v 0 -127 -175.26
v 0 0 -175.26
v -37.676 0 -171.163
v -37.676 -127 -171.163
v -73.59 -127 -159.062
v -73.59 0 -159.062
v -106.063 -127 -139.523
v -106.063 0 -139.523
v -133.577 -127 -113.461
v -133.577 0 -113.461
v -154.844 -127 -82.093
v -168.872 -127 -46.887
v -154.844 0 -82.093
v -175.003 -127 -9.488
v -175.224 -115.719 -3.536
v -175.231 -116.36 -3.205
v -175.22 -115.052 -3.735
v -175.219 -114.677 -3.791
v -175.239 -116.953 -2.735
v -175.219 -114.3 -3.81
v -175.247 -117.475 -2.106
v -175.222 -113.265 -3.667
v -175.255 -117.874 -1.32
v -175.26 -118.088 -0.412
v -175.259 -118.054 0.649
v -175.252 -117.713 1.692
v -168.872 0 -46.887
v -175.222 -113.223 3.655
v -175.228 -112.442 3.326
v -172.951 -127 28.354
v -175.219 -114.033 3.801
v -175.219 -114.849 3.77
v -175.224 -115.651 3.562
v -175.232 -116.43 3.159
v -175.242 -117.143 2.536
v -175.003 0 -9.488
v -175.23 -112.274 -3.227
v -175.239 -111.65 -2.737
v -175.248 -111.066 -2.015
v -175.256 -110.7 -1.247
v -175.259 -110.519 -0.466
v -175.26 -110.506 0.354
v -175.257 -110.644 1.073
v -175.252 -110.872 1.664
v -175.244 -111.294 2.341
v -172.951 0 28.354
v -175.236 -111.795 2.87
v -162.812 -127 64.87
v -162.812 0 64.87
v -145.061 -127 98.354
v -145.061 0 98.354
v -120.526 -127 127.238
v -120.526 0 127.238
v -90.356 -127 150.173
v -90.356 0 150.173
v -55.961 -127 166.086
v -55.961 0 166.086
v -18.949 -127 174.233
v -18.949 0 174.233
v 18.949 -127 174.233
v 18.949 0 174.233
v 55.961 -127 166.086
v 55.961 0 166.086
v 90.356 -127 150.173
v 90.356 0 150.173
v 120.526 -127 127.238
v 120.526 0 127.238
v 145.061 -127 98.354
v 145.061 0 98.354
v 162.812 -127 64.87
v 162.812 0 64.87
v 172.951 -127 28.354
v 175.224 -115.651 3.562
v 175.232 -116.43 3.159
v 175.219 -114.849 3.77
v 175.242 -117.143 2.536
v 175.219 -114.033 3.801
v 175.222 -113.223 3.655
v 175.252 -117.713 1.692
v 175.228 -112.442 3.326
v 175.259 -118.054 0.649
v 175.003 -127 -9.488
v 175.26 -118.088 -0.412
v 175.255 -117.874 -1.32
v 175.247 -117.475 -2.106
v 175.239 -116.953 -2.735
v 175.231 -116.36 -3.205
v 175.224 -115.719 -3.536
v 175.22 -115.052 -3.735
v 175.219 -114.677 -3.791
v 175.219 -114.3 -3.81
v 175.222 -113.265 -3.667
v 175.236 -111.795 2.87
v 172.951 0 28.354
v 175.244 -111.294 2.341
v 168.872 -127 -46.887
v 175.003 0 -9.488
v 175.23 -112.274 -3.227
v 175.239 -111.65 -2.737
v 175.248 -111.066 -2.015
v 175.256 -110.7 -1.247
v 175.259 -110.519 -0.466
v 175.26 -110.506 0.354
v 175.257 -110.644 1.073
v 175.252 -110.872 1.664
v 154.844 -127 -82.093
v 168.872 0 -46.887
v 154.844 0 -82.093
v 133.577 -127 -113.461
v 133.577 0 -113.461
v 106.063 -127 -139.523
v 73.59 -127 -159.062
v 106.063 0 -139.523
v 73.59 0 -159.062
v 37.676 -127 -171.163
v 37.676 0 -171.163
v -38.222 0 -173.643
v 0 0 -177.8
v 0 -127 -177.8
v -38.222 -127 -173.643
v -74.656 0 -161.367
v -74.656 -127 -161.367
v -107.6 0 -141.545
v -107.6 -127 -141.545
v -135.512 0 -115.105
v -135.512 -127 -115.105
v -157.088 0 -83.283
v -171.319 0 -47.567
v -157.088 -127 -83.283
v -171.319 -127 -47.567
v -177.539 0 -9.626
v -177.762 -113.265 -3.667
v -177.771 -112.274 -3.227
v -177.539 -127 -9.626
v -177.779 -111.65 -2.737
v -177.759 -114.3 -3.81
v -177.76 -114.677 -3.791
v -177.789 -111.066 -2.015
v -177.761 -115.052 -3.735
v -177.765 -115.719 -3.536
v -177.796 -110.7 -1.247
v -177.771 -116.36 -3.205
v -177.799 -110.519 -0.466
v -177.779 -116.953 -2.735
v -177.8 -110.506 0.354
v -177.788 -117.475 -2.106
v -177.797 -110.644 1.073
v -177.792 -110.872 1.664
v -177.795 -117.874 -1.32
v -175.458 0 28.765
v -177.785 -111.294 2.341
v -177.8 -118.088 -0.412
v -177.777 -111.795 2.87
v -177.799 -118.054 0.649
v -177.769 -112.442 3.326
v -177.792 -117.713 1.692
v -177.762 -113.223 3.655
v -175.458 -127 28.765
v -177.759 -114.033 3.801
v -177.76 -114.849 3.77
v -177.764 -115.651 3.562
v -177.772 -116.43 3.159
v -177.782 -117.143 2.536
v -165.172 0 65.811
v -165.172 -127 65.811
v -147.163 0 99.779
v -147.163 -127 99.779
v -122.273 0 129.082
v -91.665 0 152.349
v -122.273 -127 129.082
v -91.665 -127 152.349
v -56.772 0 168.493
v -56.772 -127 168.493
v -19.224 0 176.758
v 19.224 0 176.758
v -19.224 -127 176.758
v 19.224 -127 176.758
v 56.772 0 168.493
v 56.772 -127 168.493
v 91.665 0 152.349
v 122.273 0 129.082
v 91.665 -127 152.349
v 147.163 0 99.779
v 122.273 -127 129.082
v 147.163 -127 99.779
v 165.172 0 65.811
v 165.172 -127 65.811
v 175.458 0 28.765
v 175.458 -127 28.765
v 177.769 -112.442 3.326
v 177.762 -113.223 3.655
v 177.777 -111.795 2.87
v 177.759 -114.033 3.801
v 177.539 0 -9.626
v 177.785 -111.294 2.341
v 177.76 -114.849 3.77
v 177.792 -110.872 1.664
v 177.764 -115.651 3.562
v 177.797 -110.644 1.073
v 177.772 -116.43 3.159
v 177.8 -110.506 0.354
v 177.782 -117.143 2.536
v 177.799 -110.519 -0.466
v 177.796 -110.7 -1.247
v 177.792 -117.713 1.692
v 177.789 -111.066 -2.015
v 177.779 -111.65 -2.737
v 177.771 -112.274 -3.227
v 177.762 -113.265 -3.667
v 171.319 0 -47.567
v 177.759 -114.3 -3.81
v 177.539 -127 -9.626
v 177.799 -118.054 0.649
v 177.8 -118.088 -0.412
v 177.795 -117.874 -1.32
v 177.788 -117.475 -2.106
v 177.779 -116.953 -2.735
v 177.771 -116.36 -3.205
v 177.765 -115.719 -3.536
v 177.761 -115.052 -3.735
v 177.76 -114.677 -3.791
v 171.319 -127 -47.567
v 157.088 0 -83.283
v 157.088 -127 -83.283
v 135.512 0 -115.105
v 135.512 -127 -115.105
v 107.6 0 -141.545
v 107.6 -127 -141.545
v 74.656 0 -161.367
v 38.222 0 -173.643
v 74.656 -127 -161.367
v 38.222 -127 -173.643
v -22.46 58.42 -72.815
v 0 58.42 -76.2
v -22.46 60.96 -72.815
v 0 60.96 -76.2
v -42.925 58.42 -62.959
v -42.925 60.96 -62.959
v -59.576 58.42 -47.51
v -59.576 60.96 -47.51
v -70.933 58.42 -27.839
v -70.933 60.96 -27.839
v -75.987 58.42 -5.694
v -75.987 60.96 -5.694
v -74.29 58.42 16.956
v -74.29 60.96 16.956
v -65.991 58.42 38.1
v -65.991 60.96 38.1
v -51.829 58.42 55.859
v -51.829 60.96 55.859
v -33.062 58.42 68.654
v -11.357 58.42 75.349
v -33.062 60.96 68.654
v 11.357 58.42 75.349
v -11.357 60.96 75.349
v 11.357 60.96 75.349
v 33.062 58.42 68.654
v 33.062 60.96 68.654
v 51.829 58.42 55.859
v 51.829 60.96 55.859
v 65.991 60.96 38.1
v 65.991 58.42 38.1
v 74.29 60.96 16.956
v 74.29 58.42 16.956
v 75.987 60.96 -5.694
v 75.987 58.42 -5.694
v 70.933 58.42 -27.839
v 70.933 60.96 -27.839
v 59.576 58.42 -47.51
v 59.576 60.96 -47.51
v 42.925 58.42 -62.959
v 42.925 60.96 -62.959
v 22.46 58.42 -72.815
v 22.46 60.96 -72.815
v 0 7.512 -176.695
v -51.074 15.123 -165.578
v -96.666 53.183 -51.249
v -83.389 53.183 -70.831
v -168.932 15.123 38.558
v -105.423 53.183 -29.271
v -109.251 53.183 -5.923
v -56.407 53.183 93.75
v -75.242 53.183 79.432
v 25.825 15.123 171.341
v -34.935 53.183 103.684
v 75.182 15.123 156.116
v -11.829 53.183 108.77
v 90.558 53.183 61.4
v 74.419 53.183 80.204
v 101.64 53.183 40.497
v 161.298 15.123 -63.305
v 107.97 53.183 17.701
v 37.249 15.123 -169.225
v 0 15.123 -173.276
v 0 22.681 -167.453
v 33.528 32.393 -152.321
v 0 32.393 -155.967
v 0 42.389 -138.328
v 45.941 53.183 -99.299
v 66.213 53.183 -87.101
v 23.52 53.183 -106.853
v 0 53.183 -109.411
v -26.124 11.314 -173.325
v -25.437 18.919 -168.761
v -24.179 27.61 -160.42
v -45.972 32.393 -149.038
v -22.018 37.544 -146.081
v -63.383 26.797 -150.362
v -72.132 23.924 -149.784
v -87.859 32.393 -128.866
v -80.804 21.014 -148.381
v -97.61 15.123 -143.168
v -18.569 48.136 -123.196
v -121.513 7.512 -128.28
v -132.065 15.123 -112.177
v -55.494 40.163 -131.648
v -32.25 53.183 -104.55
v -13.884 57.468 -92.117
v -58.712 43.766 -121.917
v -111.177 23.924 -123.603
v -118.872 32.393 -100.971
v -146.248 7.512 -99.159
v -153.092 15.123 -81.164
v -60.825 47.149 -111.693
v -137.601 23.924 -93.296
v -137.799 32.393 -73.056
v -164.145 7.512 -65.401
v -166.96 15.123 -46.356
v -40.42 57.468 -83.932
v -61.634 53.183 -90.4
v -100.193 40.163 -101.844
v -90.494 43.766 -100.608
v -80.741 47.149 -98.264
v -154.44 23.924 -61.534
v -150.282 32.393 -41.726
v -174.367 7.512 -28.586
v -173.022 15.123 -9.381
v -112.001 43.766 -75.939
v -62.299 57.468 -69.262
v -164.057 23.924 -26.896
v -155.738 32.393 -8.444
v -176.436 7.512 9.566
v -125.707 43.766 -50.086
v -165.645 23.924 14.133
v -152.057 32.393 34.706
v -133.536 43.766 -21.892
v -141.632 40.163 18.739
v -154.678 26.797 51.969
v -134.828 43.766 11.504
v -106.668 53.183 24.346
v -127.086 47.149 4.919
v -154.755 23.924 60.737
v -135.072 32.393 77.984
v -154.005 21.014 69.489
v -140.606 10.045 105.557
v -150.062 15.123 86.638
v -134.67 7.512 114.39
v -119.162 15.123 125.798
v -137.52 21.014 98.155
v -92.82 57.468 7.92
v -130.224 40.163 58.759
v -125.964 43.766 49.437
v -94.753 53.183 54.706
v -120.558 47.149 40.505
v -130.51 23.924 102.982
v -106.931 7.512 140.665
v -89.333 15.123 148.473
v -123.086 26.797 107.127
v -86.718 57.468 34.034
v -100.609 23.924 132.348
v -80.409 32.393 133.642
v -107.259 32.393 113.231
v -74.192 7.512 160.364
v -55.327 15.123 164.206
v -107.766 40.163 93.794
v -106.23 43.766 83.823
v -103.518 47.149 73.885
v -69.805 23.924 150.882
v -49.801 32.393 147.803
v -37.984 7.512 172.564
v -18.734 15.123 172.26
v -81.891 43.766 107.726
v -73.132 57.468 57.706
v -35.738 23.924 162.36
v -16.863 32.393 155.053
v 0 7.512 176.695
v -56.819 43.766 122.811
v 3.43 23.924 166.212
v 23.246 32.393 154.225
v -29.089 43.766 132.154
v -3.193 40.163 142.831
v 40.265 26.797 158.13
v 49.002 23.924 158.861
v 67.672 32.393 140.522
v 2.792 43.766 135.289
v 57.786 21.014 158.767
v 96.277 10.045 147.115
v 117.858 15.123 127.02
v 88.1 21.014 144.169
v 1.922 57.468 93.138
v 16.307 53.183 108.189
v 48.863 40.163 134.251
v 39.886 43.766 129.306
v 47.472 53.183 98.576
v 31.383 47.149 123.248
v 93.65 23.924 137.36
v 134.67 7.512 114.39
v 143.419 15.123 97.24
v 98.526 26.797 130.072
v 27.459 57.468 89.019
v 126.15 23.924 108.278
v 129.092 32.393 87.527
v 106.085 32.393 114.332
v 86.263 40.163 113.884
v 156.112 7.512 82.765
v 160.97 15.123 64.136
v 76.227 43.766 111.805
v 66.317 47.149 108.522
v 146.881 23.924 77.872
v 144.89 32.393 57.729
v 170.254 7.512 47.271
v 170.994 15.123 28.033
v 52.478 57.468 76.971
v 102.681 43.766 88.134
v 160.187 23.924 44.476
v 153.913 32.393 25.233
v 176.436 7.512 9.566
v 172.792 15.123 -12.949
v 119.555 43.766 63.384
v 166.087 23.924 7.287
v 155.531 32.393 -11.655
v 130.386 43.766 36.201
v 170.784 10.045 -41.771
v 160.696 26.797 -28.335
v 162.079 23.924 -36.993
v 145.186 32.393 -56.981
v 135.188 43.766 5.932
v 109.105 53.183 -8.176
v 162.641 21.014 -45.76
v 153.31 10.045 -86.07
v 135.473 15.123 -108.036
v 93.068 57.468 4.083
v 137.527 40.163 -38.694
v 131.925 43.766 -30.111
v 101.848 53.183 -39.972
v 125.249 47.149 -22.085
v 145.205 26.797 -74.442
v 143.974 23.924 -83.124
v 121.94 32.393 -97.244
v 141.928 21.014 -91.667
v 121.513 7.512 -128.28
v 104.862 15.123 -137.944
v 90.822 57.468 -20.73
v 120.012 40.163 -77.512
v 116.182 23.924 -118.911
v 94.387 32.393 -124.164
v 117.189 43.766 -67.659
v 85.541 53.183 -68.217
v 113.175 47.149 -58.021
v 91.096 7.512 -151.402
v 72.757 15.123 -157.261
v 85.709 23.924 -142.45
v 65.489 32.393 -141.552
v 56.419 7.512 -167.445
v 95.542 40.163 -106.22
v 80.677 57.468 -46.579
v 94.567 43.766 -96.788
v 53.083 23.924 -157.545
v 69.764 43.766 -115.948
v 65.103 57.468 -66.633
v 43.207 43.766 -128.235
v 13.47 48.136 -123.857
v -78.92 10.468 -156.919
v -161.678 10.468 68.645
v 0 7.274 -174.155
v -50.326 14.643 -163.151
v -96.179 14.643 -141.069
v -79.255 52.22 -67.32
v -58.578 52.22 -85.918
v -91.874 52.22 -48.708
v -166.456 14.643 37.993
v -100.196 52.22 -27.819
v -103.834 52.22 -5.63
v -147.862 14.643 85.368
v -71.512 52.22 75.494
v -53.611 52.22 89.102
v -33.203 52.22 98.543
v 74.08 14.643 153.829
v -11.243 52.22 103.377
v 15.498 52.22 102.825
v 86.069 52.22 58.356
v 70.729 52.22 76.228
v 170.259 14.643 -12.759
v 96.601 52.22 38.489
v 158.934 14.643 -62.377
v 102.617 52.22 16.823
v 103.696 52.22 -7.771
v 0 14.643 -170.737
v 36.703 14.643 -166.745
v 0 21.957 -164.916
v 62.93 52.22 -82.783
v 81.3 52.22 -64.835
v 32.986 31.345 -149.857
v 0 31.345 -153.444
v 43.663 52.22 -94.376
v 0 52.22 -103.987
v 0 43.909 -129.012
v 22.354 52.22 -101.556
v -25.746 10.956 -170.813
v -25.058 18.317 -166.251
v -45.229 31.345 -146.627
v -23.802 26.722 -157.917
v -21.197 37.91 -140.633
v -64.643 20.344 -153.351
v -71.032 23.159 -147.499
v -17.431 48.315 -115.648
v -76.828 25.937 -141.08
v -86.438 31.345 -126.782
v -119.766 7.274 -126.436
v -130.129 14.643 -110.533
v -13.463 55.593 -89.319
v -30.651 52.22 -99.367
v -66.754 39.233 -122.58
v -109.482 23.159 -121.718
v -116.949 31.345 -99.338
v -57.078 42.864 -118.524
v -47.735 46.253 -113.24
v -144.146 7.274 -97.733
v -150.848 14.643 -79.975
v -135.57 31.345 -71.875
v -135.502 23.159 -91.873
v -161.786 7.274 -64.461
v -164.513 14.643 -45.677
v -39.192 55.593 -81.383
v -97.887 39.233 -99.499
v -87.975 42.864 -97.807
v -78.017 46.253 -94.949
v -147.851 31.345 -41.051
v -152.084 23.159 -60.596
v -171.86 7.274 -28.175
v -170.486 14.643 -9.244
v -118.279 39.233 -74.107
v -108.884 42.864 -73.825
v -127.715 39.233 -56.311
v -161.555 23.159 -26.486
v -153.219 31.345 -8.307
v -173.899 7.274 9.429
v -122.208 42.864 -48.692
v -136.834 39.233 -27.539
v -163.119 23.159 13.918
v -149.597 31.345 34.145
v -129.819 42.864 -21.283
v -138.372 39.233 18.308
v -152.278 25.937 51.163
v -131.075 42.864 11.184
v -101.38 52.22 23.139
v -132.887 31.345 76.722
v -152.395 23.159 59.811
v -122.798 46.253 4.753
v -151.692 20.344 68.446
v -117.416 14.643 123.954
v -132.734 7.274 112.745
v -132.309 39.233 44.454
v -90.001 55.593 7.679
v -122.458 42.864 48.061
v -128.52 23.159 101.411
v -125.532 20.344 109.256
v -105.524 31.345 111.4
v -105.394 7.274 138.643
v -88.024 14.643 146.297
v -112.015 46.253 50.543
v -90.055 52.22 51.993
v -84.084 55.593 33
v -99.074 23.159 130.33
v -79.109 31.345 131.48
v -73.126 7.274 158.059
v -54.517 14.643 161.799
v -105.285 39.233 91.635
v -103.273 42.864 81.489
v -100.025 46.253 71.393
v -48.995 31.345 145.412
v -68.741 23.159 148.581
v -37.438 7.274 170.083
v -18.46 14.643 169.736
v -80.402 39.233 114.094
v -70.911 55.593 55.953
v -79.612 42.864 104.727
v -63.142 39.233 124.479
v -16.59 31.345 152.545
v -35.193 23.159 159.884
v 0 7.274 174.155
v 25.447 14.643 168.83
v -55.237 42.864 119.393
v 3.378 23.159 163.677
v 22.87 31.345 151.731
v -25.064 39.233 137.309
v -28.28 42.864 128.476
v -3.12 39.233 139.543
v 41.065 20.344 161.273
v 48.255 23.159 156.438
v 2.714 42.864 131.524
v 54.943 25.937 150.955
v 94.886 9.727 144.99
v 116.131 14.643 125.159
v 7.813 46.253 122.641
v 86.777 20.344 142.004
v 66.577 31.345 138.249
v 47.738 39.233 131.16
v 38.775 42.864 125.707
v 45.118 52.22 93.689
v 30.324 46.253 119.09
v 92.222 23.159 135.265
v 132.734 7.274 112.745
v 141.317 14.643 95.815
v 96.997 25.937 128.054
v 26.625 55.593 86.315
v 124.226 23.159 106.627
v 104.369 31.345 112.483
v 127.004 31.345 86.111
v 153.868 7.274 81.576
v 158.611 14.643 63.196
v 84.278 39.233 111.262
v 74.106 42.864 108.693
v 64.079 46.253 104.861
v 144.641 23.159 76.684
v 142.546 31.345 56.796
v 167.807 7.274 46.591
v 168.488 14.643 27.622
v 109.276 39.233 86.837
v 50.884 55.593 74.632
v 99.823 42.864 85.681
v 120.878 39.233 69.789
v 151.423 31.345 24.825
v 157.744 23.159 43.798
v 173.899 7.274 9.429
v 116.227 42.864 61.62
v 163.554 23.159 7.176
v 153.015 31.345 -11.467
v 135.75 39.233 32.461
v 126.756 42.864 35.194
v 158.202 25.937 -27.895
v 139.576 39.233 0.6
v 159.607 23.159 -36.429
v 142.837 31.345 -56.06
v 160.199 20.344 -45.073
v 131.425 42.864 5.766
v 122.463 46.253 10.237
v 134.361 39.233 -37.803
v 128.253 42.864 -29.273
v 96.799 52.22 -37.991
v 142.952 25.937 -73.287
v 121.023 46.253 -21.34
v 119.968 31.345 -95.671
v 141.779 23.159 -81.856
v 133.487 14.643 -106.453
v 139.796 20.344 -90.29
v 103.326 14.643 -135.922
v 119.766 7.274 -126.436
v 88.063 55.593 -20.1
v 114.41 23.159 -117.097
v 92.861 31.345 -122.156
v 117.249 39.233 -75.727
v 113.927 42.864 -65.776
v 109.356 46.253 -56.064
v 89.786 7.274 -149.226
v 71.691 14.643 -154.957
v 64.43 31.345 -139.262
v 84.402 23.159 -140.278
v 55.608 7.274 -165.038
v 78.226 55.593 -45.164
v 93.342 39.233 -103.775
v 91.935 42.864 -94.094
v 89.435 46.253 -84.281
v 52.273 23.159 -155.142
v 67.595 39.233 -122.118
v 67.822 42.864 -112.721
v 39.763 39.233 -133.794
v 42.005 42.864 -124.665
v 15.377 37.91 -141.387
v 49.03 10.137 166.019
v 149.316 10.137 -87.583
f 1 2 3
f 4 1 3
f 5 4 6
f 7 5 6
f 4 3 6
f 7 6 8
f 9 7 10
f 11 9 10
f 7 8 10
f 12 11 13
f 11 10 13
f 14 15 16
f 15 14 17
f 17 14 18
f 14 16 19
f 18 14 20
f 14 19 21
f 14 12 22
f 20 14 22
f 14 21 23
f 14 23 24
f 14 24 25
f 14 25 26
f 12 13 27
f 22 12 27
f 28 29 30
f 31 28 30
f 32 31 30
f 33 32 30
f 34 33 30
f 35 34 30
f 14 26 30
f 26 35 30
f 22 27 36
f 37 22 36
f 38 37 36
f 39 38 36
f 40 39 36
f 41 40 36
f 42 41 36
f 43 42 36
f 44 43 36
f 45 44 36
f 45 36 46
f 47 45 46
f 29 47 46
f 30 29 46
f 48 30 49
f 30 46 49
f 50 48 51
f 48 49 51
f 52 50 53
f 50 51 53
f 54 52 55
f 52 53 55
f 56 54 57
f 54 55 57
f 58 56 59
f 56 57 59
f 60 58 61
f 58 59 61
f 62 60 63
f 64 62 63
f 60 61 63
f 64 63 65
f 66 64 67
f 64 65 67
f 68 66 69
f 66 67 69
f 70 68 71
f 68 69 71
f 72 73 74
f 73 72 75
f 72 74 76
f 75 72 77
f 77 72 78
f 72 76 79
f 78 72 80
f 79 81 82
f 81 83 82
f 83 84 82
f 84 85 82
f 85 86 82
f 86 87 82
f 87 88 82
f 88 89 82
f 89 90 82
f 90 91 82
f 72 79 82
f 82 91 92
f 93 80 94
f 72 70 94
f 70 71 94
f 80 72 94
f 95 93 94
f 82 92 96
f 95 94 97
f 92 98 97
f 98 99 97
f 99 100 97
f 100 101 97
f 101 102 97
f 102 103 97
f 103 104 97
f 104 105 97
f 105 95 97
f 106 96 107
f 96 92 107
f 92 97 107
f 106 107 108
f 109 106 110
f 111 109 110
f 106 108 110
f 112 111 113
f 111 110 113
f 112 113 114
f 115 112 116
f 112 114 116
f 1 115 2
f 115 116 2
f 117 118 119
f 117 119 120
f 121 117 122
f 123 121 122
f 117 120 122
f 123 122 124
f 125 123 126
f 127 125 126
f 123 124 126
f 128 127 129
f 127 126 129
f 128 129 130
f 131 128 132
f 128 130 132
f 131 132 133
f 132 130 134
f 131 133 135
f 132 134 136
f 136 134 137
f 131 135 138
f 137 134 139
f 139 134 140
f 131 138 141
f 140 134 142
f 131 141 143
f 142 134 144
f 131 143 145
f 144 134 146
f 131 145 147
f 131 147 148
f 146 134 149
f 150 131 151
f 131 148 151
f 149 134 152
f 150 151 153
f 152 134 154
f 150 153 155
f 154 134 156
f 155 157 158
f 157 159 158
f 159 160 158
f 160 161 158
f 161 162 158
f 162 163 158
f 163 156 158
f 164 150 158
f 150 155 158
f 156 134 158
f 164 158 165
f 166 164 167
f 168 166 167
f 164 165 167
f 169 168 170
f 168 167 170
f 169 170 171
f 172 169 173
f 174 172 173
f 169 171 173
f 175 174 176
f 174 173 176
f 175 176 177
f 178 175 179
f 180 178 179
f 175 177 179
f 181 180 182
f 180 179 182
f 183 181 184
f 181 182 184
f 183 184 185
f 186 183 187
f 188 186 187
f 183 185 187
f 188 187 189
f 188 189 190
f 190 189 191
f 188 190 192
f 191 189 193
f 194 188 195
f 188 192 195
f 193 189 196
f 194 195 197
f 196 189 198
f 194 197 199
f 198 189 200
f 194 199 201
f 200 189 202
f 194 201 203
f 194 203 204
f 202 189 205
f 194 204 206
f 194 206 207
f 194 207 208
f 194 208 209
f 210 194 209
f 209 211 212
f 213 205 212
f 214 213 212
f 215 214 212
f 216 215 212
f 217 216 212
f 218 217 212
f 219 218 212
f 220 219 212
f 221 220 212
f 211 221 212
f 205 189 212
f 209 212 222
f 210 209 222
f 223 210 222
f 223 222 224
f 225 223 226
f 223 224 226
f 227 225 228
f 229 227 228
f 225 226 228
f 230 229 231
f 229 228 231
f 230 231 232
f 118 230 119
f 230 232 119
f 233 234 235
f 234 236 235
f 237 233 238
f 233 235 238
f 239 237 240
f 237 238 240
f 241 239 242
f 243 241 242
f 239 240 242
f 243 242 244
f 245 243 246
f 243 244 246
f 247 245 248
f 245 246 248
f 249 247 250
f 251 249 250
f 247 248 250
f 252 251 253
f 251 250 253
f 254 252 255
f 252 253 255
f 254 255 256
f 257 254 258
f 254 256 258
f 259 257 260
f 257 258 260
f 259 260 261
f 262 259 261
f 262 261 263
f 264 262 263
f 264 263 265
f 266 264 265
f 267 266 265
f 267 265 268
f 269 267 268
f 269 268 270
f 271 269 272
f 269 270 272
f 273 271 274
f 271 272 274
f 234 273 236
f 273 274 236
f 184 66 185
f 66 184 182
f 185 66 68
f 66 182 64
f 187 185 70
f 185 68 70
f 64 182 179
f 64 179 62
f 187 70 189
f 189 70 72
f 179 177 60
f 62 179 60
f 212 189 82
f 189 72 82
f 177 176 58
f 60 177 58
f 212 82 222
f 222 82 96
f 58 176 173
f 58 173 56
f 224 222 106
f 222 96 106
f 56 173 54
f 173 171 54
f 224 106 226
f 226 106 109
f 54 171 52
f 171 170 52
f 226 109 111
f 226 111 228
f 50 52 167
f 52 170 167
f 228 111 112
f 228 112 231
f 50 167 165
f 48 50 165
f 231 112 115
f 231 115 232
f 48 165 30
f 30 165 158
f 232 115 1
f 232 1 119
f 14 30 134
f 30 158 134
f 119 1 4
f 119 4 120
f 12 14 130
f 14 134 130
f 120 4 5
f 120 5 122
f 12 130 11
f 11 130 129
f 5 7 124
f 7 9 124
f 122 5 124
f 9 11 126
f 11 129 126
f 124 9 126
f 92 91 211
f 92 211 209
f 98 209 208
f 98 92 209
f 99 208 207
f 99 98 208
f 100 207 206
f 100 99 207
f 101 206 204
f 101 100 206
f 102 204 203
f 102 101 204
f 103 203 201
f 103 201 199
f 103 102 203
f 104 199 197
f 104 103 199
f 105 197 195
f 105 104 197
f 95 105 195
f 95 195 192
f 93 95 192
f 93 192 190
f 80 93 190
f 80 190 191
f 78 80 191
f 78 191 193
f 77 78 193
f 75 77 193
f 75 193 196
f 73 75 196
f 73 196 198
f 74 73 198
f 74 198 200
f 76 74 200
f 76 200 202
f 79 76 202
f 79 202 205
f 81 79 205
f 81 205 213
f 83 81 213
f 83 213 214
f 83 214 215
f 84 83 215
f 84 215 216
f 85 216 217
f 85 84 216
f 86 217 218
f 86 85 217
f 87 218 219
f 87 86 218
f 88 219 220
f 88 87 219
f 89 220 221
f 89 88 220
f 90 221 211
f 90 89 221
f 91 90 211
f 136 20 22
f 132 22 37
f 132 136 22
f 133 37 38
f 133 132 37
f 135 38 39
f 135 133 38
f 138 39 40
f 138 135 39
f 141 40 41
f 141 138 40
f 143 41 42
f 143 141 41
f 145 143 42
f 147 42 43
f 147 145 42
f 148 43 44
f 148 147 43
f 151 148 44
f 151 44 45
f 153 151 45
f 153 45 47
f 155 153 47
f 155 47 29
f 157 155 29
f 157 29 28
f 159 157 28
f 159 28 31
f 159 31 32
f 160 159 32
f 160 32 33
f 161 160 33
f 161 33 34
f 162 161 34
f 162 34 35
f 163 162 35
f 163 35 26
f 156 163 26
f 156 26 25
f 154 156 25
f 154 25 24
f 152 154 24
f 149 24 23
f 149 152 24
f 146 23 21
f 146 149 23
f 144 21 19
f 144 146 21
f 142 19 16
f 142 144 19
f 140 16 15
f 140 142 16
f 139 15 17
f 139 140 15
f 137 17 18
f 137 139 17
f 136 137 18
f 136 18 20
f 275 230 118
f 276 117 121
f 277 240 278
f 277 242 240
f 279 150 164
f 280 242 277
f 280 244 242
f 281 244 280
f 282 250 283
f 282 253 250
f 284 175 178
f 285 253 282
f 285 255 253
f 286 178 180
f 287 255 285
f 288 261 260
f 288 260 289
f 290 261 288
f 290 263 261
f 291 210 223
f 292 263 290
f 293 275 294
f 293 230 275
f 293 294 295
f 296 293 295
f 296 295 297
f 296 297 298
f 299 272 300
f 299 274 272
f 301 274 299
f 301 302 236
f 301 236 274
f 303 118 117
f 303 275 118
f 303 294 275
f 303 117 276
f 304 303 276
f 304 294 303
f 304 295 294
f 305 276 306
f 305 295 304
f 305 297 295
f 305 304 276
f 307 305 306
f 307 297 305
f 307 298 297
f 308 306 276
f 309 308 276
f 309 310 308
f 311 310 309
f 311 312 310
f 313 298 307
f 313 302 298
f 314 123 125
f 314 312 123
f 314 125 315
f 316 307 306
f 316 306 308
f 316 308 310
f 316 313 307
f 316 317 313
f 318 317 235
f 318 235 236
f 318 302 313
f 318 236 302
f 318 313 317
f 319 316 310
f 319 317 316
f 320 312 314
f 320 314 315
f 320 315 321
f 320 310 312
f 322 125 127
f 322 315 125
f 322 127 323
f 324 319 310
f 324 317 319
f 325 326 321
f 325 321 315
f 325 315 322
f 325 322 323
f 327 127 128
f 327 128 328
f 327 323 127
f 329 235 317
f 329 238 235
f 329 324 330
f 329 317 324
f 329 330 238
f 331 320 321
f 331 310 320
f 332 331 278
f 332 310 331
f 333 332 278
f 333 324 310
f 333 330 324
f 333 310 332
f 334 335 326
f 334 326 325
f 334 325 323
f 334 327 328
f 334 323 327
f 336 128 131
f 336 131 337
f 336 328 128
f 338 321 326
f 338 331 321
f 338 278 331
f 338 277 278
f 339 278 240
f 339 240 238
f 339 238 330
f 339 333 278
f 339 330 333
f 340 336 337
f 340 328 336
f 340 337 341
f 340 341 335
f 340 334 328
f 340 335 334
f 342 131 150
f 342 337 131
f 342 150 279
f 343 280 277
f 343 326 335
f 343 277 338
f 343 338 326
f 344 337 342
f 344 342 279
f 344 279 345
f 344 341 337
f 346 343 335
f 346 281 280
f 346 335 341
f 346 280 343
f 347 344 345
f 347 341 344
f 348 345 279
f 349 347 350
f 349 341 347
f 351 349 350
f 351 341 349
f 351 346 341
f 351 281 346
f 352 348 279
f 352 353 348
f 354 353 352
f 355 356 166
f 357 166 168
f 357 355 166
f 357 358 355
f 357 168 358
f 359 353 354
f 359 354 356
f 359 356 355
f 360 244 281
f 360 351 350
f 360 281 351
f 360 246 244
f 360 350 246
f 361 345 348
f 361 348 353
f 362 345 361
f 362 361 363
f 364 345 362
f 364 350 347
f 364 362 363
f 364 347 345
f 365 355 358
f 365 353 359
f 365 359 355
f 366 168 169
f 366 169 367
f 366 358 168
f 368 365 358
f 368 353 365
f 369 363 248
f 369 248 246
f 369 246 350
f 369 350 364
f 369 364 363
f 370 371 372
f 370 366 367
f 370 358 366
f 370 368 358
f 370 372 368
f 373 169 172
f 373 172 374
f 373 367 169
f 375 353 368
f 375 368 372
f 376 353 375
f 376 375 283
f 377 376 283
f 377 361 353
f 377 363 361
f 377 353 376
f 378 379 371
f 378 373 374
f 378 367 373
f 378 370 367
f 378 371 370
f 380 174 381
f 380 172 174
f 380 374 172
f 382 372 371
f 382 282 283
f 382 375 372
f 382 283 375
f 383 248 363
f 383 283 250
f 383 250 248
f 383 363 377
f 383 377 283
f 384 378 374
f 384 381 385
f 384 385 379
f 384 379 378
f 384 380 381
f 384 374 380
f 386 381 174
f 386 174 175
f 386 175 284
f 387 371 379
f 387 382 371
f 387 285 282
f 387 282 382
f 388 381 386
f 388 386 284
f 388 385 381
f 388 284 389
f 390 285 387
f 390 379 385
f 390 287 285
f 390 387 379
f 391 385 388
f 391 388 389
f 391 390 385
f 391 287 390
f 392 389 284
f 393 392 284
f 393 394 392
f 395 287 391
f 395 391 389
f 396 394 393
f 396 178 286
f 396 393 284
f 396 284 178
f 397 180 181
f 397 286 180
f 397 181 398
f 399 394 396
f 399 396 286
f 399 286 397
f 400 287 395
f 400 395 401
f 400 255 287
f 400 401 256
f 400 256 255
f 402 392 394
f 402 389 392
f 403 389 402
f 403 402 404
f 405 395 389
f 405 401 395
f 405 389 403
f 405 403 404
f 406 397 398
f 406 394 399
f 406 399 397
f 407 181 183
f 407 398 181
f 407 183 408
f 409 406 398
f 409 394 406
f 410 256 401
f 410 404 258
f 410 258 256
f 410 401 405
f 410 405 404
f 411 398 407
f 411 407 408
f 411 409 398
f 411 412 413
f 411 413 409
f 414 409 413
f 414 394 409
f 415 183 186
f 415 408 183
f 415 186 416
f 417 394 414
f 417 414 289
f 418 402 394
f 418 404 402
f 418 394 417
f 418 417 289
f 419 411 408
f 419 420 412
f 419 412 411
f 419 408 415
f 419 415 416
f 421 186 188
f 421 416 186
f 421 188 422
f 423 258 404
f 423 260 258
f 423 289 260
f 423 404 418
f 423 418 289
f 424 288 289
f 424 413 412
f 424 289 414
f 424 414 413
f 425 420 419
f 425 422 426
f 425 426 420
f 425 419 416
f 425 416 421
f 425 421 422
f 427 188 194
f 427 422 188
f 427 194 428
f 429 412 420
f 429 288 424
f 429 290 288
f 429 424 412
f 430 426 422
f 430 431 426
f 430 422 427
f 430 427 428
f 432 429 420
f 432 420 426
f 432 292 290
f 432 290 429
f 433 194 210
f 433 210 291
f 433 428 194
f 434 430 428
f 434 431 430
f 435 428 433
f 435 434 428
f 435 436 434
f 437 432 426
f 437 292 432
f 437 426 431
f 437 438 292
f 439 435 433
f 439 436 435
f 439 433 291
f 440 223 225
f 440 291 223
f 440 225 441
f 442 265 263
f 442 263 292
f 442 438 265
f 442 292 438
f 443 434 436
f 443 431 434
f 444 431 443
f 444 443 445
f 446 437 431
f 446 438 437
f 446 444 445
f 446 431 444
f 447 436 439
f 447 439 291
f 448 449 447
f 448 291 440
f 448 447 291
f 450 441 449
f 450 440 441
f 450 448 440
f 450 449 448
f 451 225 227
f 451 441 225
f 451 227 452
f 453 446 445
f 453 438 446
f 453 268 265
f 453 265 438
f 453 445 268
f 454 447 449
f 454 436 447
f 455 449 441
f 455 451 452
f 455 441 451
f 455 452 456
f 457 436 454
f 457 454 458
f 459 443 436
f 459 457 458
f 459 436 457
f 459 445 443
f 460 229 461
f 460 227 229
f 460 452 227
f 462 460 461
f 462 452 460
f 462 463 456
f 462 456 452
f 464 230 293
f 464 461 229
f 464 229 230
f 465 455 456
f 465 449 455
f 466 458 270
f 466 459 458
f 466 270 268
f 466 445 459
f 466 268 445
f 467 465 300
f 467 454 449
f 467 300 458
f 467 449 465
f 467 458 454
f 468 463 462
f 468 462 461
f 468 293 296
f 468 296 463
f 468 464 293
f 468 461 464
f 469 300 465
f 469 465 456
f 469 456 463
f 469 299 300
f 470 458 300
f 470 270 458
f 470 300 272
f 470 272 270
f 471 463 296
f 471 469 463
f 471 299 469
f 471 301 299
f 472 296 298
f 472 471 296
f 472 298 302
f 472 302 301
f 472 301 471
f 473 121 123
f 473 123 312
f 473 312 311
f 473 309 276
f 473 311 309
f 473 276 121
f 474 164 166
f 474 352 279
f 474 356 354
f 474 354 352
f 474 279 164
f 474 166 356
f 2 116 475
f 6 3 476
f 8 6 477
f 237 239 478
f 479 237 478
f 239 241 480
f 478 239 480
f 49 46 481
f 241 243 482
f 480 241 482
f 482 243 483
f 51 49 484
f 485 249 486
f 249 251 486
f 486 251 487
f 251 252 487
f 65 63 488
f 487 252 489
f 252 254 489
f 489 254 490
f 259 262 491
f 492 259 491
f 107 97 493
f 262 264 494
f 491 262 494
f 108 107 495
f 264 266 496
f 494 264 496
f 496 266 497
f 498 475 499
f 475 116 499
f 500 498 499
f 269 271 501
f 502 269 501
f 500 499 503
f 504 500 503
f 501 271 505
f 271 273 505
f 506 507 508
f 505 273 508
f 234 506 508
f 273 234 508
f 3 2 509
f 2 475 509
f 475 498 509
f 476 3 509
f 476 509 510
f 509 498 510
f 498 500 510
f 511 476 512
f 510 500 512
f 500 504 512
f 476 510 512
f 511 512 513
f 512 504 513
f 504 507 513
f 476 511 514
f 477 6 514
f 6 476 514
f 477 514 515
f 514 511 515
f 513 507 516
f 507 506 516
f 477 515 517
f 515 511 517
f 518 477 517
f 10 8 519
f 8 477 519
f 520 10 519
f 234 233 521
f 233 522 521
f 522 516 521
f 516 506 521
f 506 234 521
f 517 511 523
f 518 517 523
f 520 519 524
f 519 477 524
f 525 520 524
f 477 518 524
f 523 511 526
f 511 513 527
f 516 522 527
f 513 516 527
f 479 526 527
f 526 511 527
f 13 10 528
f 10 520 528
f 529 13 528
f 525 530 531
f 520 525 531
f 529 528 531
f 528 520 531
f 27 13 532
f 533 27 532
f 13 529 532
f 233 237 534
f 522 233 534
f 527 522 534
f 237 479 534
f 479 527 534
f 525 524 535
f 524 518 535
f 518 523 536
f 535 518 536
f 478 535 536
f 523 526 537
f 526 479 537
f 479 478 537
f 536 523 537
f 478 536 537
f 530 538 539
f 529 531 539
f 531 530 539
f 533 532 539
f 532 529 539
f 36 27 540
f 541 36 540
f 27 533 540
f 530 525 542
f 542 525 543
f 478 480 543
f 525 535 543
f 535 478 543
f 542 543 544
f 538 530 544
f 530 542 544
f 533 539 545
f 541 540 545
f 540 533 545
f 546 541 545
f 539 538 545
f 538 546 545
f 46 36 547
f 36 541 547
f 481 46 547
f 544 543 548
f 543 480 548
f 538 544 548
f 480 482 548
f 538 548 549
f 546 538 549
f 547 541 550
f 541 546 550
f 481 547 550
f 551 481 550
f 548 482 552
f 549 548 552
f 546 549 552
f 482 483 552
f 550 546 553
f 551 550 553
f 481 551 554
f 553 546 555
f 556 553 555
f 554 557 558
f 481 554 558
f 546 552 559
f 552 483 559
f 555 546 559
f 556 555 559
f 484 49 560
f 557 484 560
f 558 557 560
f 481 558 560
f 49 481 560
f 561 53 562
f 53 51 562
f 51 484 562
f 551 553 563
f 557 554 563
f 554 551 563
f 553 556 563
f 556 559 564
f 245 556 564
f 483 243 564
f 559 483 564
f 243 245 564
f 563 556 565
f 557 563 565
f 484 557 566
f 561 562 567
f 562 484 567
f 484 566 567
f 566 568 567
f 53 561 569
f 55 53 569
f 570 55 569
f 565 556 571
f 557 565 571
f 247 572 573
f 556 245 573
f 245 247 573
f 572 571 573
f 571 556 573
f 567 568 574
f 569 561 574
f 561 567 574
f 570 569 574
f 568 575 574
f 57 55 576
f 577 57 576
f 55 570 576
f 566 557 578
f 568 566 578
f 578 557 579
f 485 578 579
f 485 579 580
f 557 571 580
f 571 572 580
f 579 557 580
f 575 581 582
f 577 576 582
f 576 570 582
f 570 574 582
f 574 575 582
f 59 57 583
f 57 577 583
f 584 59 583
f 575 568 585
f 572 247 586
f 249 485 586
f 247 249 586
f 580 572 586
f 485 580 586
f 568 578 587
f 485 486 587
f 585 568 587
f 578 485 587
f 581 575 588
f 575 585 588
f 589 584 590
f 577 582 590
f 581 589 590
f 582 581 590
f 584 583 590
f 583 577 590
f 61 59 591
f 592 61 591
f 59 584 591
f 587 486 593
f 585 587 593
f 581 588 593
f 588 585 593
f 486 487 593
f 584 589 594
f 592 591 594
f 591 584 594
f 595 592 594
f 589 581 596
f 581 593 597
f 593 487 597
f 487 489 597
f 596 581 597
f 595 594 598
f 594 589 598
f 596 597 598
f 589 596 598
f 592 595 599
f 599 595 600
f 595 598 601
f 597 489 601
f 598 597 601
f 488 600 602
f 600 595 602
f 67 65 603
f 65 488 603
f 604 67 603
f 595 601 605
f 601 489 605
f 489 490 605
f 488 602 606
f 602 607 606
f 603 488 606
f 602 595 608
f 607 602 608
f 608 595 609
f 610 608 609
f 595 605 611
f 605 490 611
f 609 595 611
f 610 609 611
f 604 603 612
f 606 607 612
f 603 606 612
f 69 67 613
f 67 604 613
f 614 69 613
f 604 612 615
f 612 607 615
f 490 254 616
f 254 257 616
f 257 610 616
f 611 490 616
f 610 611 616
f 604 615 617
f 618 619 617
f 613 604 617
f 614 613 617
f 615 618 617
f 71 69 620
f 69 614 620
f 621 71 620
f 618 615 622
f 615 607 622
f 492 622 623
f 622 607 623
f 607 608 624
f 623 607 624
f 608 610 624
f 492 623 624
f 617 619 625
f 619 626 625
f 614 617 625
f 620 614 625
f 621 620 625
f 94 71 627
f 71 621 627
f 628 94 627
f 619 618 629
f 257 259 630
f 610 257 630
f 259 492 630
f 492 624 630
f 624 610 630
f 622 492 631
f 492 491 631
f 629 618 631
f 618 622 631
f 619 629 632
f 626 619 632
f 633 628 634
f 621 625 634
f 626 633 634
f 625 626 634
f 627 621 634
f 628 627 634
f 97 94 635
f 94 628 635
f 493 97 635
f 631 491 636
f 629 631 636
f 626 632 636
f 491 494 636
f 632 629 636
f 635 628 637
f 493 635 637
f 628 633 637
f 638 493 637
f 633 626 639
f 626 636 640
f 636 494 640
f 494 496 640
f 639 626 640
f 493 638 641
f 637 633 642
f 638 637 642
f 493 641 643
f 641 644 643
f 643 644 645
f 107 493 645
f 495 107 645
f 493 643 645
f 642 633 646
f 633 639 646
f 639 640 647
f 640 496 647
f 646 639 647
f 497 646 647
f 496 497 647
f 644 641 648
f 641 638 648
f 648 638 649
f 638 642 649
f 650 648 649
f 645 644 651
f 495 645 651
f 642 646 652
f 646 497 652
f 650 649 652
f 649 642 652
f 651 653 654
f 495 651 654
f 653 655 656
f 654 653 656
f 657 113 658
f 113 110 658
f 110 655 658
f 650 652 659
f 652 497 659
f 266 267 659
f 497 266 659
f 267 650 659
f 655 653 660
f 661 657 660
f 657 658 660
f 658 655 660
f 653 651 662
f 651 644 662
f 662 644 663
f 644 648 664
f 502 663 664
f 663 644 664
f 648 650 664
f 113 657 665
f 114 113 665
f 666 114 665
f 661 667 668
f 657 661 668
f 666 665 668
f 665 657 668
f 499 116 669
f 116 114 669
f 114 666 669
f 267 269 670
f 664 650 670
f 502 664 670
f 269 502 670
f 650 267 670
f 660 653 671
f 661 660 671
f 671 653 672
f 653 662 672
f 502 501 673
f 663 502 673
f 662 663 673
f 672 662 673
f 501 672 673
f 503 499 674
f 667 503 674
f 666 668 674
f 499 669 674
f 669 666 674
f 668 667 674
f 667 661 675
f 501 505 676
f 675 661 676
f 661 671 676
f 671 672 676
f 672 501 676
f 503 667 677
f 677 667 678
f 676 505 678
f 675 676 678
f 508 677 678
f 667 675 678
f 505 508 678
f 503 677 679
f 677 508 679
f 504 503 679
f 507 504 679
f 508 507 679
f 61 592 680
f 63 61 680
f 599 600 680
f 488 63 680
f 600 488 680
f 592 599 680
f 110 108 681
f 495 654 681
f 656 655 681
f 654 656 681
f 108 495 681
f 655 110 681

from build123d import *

# Parameters (mm, degrees)
CUT_EXTRUDE1_DEPTH      = 282.699627389
CUT_EXTRUDE1_DEPTH_BACK = 282.699627389
SKETCH2_R               = 3.81


with BuildPart() as part:
    # Sketch1 → Revolve1 (revolve)
    with BuildSketch(Plane.XY):
        with BuildLine():
            Line((175.26, -127), (175.26, 0))
            add(Edge.make_bspline(
                [(175.26, 0), (175.26, 40.716969697), (76.2, 58.42)],
                knots=[0, 0, 0, 1.120999466, 1.120999466, 1.120999466], degree=2, weights=[1, 0.846989554, 1]))
            Line((76.2, 58.42), (76.2, 60.96))
            add(Edge.make_bspline(
                [(177.8, 0), (177.8, 42.672), (76.2, 60.96)],
                knots=[0, 0, 0, 1.127885283, 1.127885283, 1.127885283], degree=2, weights=[1, 0.845154255, 1]))
            Line((177.8, 0), (177.8, -127))
            Line((177.8, -127), (175.26, -127))
        make_face()
    revolve(axis=Axis((0, -109.728, 0), (0, 1, 0)))

    # Sketch2 → Cut-Extrude1 (cut, two sides: drawn at the far end of the back side and taken through both)
    with BuildSketch(Plane(origin=(0, 0, 0), x_dir=(0, 0, -1), z_dir=(1, 0, 0)).offset(-CUT_EXTRUDE1_DEPTH_BACK)):
        with Locations((0, -114.3)):
            Circle(SKETCH2_R)
    extrude(amount=CUT_EXTRUDE1_DEPTH + CUT_EXTRUDE1_DEPTH_BACK, mode=Mode.SUBTRACT)


solid = part.part
